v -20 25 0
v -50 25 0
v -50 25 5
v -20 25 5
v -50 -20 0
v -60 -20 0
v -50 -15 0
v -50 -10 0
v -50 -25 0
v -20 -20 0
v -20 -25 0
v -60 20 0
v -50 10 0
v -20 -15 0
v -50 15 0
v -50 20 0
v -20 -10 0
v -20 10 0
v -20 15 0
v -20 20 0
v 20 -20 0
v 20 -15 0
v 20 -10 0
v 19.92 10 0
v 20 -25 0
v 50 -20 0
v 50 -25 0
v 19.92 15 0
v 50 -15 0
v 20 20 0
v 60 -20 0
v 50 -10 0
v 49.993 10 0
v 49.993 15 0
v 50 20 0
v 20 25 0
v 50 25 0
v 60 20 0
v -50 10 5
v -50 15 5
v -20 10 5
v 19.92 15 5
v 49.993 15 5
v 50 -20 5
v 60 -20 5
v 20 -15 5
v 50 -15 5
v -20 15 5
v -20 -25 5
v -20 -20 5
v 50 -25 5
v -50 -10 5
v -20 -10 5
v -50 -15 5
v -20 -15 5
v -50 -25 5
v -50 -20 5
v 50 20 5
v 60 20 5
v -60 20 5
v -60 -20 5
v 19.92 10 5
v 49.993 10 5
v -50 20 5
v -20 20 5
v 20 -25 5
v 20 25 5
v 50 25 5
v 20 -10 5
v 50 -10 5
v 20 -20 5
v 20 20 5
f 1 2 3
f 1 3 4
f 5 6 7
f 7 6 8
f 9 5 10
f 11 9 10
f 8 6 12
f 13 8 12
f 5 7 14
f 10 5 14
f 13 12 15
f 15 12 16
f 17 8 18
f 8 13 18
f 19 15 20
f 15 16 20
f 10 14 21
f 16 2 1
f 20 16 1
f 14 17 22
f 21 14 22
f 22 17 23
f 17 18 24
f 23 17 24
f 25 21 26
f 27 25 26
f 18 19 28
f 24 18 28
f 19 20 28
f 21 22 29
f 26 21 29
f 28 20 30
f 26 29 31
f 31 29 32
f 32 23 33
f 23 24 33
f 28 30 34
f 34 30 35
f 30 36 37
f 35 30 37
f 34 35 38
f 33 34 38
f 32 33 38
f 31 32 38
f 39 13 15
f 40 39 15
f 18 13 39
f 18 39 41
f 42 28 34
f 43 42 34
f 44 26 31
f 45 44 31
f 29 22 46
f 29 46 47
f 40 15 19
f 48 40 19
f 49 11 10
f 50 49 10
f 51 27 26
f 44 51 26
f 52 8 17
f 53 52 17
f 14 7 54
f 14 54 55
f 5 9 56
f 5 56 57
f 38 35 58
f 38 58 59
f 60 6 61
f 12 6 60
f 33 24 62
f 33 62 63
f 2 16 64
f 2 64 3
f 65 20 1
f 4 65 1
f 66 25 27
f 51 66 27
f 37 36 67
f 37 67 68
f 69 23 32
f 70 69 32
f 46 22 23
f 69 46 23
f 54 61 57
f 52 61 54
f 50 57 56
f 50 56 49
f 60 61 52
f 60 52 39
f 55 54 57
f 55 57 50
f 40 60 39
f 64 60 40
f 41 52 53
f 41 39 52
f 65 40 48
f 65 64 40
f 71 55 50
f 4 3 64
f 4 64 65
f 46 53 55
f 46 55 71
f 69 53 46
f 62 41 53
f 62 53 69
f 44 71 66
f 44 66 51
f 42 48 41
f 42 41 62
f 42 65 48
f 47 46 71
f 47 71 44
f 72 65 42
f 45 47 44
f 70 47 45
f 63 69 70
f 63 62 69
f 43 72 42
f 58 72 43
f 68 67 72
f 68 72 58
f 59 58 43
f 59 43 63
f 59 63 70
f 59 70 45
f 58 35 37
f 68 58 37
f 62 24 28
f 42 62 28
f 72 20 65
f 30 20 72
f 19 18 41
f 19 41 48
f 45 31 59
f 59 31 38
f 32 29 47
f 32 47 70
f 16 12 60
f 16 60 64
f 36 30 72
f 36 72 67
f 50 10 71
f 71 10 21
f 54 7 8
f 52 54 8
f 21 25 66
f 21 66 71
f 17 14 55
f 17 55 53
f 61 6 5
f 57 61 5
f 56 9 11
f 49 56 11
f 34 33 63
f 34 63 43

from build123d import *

# Parameters (mm, degrees)
SKETCH1_W           = 120
SKETCH1_H           = 40
SKETCH1_W_2         = 30.073092916
SKETCH1_H_2         = 5
SKETCH1_W_3         = 30
BOSS_EXTRUDE1_DEPTH = 5


with BuildPart() as part:
    # Sketch1 → Boss-Extrude1 (new body)
    with BuildSketch(Plane.XY):
        Rectangle(SKETCH1_W, SKETCH1_H)
        with Locations((34.956464204, 12.5)):
            Rectangle(SKETCH1_W_2, SKETCH1_H_2, mode=Mode.SUBTRACT)
        with Locations((-35, 12.5)):
            Rectangle(SKETCH1_W_3, SKETCH1_H_2, mode=Mode.SUBTRACT)
        with Locations((-35, -12.5)):
            Rectangle(SKETCH1_W_3, SKETCH1_H_2, mode=Mode.SUBTRACT)
        with Locations((35, -12.5)):
            Rectangle(SKETCH1_W_3, SKETCH1_H_2, mode=Mode.SUBTRACT)
        with Locations((-35, -22.5)):
            Rectangle(SKETCH1_W_3, SKETCH1_H_2)
        with Locations((35, -22.5)):
            Rectangle(SKETCH1_W_3, SKETCH1_H_2)
        with Locations((35, 22.5)):
            Rectangle(SKETCH1_W_3, SKETCH1_H_2)
        with Locations((-35, 22.5)):
            Rectangle(SKETCH1_W_3, SKETCH1_H_2)
    extrude(amount=BOSS_EXTRUDE1_DEPTH)


solid = part.part
